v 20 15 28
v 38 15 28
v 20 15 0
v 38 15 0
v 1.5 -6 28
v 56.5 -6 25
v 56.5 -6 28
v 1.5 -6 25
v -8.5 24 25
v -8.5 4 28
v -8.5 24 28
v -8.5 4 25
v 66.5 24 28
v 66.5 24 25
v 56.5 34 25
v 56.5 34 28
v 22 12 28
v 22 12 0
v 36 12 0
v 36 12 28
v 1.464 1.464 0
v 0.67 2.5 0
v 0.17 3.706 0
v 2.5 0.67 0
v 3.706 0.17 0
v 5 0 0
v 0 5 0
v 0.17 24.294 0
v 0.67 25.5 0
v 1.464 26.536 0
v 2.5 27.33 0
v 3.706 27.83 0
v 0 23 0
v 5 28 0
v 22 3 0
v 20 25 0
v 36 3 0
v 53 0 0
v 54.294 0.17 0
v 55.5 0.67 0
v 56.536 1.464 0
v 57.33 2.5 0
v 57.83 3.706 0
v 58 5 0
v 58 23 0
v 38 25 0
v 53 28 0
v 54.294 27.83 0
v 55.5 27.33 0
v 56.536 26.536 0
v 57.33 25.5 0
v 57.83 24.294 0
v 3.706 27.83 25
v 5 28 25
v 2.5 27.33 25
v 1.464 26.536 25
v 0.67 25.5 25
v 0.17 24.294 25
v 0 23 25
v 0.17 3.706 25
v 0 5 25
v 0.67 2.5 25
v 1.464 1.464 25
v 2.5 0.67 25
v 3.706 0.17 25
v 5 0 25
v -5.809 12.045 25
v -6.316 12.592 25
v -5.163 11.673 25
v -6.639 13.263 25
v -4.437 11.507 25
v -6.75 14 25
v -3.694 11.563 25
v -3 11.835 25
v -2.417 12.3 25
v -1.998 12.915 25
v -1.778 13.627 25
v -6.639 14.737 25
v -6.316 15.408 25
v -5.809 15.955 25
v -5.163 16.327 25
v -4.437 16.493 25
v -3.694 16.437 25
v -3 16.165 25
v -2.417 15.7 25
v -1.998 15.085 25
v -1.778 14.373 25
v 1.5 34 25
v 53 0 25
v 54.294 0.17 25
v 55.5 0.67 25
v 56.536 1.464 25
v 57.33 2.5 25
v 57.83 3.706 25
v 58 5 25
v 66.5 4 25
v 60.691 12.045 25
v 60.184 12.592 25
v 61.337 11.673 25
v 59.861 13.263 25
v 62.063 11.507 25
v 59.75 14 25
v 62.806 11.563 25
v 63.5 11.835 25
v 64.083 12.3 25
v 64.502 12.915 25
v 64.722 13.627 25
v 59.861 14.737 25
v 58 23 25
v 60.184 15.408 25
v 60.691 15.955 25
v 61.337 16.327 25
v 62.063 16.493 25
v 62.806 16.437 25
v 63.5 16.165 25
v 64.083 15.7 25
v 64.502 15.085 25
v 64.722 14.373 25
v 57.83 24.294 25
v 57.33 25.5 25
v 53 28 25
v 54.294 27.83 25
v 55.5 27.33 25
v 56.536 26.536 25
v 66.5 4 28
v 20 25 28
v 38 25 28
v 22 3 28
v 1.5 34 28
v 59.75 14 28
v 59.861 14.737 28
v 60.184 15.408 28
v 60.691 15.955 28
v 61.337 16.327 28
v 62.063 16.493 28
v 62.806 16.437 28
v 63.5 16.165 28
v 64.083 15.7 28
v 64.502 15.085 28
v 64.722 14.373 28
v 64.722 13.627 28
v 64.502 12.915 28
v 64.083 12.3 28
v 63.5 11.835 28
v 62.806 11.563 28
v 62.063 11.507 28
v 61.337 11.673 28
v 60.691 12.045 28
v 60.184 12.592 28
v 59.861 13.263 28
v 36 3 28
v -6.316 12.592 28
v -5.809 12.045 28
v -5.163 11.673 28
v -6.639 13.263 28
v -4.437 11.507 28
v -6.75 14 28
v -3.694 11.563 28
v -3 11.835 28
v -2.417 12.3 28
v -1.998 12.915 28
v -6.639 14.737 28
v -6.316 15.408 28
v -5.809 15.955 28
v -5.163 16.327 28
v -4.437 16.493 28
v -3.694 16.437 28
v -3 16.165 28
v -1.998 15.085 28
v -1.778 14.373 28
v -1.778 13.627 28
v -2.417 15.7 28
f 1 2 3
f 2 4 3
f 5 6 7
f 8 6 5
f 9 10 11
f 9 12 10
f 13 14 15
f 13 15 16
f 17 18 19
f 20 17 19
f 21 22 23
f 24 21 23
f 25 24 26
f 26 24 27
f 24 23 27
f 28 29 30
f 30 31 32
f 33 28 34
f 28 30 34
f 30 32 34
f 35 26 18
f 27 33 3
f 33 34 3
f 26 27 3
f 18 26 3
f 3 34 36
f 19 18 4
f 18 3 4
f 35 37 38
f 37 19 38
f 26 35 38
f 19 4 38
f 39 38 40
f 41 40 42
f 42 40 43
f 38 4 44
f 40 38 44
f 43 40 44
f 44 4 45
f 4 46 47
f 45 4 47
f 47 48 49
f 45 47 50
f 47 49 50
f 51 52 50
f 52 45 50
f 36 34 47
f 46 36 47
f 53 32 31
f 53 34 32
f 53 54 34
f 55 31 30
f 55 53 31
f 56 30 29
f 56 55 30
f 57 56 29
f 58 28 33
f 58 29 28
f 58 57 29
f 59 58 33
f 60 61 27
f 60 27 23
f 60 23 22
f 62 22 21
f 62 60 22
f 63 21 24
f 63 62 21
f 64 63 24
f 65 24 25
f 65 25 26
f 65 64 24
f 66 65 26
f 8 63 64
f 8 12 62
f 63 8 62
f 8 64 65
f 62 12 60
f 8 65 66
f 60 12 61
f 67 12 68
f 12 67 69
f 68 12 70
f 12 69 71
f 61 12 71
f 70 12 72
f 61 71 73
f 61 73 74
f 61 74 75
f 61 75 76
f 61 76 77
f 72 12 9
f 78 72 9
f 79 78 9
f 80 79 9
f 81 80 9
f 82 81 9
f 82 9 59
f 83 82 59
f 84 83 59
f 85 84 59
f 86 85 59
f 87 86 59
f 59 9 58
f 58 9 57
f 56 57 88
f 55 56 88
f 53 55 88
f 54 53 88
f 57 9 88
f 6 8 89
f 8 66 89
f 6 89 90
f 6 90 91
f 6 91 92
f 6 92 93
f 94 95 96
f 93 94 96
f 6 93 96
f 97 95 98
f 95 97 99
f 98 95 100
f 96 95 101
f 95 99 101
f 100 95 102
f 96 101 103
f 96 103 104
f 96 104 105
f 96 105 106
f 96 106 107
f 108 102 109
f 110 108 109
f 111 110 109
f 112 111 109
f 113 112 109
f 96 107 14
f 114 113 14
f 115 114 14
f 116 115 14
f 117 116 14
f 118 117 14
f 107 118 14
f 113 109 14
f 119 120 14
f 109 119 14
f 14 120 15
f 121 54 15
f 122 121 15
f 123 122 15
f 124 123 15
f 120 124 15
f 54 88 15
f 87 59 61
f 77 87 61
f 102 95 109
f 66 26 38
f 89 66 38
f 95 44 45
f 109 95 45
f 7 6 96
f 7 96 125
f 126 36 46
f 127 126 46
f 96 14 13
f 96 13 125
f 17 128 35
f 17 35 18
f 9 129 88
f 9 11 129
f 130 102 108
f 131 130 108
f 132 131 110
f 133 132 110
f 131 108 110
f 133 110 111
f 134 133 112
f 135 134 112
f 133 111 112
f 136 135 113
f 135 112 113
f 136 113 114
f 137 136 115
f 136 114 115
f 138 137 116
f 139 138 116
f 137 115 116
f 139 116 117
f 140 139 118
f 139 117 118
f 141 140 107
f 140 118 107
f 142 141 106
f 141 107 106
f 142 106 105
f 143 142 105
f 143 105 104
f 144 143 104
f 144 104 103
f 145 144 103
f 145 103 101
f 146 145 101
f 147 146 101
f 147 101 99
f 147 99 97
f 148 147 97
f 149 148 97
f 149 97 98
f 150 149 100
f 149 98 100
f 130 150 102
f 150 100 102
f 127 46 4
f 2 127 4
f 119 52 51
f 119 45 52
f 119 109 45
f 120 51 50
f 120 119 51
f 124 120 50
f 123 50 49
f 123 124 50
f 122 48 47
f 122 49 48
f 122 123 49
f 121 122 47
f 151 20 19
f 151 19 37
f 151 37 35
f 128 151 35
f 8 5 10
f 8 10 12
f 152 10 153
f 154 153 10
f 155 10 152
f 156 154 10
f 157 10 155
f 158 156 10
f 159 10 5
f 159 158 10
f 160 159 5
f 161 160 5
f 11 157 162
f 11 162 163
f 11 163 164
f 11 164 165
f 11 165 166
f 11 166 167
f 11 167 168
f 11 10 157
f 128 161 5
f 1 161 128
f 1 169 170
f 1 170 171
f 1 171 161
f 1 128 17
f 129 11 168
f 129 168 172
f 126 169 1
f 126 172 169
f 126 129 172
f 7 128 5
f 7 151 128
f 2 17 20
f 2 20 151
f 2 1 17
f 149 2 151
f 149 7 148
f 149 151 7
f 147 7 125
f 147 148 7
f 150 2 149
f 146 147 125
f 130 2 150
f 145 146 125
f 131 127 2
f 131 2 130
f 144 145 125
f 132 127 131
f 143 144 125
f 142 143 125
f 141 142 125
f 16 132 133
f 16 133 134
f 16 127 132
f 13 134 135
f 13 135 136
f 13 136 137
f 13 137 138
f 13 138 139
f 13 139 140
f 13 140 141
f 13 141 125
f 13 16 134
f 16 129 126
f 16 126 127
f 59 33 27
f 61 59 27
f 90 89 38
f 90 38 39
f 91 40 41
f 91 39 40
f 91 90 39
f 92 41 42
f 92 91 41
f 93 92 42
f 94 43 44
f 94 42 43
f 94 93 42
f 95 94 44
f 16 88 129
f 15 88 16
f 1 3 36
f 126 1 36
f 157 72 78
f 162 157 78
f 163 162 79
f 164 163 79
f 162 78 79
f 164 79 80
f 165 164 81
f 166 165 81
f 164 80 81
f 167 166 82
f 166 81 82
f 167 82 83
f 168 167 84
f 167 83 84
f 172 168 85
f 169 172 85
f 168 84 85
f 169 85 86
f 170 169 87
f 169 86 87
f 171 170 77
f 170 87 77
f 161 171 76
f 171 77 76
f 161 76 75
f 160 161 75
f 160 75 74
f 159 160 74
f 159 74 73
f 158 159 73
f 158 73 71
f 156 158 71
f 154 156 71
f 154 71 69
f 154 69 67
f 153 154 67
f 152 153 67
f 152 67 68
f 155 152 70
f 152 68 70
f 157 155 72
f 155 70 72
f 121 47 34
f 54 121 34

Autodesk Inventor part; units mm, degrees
ref_plane "YZ Plane" through (0, 0, 0) normal (1, 0, 0) x (0, 1, 0)
ref_plane "XZ Plane" through (0, 0, 0) normal (0, 1, 0) x (-1, 0, 0)
ref_plane "XY Plane" through (0, 0, 0) normal (0, 0, 1) x (1, 0, 0)
sketch "Sketch1" plane through (0, 0, 0) normal (0, 0, 1) x (1, 0, 0)
  line L0 (0, 0) -> (58, 0)
  line L1 (58, 0) -> (58, 28)
  line L2 (58, 28) -> (0, 28)
  line L3 (0, 28) -> (0, 0)
  line L4 (22, 12) -> (36, 12)
  line L5 (36, 12) -> (36, 3)
  line L6 (36, 3) -> (22, 3)
  line L7 (22, 3) -> (22, 12)
  line L8 (20, 25) -> (38, 25)
  line L9 (38, 25) -> (38, 15)
  line L10 (38, 15) -> (20, 15)
  line L11 (20, 15) -> (20, 25)
  line L12 (29, 25) -> (29, 3) construction
  point P0 (29, 28)
  point P1 (29, 12)
  point P2 (29, 14)
  point P3 (0, 14)
  dimension "d0" = 14
  dimension "d1" = 9
  dimension "d2" = 28
  dimension "d3" = 58
  dimension "d4" = 18
  dimension "d5" = 10
  dimension "d6" = 3
extrude "Extrusion1" add sketch "Sketch1" along normal blind 25
fillet "Fillet1" radius 5 4 edges at (0, 28, 12.5) (0, 0, 12.5) (58, 0, 12.5) (58, 28, 12.5)
sketch "Sketch2" plane through (0, 0, 25) normal (0, 0, 1) x (1, 0, 0)
  arc A0 (58, 23) -> (53, 28) centre (53, 23) ccw projected
  line L0 (53, 28) -> (5, 28) projected
  arc A1 (5, 28) -> (0, 23) centre (5, 23) ccw projected
  line L1 (0, 23) -> (0, 5) projected
  arc A2 (0, 5) -> (5, 0) centre (5, 5) ccw projected
  line L2 (5, 0) -> (53, 0) projected
  arc A3 (53, 0) -> (58, 5) centre (53, 5) ccw projected
  line L3 (58, 5) -> (58, 23) projected
  line L4 (38, 25) -> (38, 15) projected
  line L5 (38, 15) -> (20, 15) projected
  line L6 (20, 15) -> (20, 25) projected
  line L7 (20, 25) -> (38, 25) projected
  line L8 (36, 12) -> (36, 3) projected
  line L9 (36, 3) -> (22, 3) projected
  line L10 (22, 3) -> (22, 12) projected
  line L11 (22, 12) -> (36, 12) projected
  line L12 (-8.5, 34) -> (66.5, 34)
  line L13 (66.5, 34) -> (66.5, -6)
  line L14 (66.5, -6) -> (-8.5, -6)
  line L15 (-8.5, -6) -> (-8.5, 34)
  point P0 (29, 34)
  point P1 (29, 28)
  point P2 (0, 14)
  point P3 (-8.5, 14)
  dimension "d11" = 40
  dimension "d12" = 75
extrude "Extrusion2" add sketch "Sketch2" along normal blind 3 contours L3 A3 L2 A2 L1 A1 L0 A0 | L12 L13 L14 L15
chamfer "Chamfer1" distance 10 angle 45 4 edges at (-8.5, 34, 26.5) (-8.5, -6, 26.5) (66.5, 34, 26.5) (66.5, -6, 26.5)
sketch "Sketch3" plane through (0, 0, 25) normal (0, 0, -1) x (-1, 0, 0)
  circle A0 centre (-62.25, 14) radius 2.5
  circle A1 centre (4.25, 14) radius 2.5
  line L0 (-58, 5) -> (-58, 23) projected
  line L1 (-58, 14) -> (-66.5, 14) construction
  line L2 (-66.5, 24) -> (-66.5, 4) construction
  line L3 (8.5, 4) -> (8.5, 24) construction
  line L4 (0, 23) -> (0, 5) construction
  line L5 (0, 14) -> (8.5, 14) construction
  line L6 (8.5, 24) -> (8.5, 4) projected
  point P0 (0, 0)
  point P1 (-62.25, 14)
  point P2 (4.25, 14)
  dimension "d18" = 5
  dimension "d19" = 5
extrude "Extrusion3" cut sketch "Sketch3" against normal through all
properties part number "BA28" material "ABS Plastic"
